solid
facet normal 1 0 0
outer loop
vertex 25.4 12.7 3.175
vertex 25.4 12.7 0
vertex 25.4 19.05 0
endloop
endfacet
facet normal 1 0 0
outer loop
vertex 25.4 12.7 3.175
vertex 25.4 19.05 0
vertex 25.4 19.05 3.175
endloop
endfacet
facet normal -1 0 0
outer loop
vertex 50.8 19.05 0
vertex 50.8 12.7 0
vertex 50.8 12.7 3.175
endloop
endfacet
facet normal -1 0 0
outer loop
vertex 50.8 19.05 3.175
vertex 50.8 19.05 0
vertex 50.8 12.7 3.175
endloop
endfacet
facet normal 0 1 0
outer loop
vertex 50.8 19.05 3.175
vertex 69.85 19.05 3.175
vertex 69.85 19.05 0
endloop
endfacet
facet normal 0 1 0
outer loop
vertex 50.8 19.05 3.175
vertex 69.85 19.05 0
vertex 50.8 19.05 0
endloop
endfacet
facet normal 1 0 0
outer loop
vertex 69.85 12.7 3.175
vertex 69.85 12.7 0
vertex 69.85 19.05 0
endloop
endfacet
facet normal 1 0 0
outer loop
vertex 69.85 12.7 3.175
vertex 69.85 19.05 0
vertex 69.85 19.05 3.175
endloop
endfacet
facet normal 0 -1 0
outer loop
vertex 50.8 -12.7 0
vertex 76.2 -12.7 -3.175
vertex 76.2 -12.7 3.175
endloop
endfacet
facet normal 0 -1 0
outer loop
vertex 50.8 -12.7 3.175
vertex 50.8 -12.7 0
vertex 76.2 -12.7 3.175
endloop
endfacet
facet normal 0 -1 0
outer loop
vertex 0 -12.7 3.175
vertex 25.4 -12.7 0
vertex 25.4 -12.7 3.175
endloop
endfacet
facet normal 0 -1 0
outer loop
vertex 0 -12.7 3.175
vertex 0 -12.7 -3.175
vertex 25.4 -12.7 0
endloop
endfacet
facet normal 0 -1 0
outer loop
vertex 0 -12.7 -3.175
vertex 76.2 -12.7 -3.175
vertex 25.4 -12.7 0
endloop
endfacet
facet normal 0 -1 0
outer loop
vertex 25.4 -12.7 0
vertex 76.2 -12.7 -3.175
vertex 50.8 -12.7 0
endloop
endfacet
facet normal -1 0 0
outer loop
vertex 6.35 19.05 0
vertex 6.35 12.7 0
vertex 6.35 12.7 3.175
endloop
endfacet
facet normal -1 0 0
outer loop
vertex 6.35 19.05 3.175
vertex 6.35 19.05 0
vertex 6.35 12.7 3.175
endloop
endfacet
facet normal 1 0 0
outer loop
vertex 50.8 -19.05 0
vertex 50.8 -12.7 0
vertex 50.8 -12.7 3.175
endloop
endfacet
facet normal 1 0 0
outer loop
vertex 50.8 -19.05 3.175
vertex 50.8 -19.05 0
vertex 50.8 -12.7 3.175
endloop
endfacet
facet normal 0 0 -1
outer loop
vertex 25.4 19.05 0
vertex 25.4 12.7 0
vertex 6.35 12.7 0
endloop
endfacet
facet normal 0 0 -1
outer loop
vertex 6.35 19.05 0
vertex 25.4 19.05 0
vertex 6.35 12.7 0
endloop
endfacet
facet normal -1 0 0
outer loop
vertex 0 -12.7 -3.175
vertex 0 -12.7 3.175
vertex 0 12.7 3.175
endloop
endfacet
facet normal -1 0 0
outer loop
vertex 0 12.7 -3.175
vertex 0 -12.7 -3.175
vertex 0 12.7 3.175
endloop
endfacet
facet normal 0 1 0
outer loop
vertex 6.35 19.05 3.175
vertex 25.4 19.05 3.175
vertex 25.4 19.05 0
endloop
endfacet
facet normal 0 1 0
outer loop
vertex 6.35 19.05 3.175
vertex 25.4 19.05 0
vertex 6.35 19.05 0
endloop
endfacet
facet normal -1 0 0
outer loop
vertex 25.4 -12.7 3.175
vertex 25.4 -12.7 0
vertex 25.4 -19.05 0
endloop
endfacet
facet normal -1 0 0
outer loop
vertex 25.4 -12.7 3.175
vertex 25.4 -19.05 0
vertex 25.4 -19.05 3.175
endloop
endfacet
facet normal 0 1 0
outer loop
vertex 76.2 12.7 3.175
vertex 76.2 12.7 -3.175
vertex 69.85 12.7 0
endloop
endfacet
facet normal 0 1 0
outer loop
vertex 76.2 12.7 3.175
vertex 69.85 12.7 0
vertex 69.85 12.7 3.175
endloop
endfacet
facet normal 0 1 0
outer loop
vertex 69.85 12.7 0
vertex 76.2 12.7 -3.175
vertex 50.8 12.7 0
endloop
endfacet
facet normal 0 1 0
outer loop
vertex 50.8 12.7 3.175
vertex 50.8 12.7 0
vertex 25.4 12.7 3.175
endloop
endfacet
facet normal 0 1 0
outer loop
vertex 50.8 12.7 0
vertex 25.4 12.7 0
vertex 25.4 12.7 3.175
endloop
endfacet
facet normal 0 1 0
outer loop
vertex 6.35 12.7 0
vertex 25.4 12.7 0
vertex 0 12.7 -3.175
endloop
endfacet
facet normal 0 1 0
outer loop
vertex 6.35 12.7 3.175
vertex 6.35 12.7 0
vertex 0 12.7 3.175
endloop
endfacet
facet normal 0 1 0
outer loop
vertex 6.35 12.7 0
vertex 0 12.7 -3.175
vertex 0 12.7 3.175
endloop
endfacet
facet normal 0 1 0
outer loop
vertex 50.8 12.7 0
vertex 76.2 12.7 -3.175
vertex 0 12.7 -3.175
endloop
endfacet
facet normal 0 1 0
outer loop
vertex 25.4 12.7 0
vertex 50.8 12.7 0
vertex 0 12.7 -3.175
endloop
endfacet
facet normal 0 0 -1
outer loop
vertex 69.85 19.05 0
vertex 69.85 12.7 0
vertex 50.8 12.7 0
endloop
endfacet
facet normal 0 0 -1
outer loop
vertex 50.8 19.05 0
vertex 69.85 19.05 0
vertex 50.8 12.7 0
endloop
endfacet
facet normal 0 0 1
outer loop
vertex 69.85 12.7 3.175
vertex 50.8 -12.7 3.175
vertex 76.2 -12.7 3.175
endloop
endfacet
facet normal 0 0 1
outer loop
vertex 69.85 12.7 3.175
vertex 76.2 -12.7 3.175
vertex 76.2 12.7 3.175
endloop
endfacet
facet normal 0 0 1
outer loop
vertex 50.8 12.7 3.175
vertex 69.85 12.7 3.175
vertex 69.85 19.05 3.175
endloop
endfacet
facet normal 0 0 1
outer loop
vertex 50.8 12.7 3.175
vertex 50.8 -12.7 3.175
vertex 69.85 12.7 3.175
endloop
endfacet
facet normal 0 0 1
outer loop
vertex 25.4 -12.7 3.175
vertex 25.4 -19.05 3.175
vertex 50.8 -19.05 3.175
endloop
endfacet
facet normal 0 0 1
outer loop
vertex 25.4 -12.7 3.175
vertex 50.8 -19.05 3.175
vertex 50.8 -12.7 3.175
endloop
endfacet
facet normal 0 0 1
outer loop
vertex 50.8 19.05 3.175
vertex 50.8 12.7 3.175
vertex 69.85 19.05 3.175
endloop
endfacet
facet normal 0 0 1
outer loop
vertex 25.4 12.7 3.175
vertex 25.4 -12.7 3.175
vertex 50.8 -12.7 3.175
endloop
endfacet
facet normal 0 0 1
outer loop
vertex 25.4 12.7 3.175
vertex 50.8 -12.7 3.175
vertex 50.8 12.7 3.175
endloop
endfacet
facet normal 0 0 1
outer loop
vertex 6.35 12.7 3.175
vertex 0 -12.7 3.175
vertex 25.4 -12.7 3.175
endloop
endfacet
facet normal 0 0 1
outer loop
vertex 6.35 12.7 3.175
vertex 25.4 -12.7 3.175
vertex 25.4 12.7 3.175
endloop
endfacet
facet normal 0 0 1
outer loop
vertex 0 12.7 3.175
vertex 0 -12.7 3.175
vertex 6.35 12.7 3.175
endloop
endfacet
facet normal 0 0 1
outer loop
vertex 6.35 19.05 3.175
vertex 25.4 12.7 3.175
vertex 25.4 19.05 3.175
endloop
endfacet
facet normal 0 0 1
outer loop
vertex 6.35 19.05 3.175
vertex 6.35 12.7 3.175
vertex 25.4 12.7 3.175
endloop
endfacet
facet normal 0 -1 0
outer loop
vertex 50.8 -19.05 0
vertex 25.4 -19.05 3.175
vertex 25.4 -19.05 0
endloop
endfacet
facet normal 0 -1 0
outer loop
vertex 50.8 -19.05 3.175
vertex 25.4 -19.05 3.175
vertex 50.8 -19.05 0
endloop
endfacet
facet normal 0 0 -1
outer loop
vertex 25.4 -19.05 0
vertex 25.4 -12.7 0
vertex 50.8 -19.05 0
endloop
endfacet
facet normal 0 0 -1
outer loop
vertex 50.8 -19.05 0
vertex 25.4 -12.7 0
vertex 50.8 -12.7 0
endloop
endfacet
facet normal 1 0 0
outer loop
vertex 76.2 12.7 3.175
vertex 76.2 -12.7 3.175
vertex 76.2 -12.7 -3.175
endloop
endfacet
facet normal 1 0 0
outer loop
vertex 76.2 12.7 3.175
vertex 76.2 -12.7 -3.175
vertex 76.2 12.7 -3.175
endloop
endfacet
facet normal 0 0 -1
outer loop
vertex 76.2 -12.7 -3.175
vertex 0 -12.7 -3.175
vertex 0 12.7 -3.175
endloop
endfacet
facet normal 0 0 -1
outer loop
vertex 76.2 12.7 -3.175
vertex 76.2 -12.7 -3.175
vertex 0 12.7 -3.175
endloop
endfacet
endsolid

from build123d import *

# Parameters (mm, degrees)
F0_W     = 25.4
F0_H     = 6.35
F1_DEPTH = 76.2
F2_W     = 25.4
F2_H     = 3.175
F3_DEPTH = 6.35
F4_W     = 19.05
F4_H     = 3.175
F5_DEPTH = 6.35


with BuildPart() as f1:
    # F0 (on Right) → F1 (new body)
    with BuildSketch(Plane.YZ):
        Rectangle(F0_W, F0_H)
    extrude(amount=F1_DEPTH)

    # F2 (on face) → F3 (join)
    with BuildSketch(Plane.XZ.offset(12.7)):
        with Locations((38.1, 1.5875)):
            Rectangle(F2_W, F2_H)
    extrude(amount=F3_DEPTH)

    # F4 (on face) → F5 (join)
    with BuildSketch(Plane(origin=(0, 12.7, 0), x_dir=(-1, 0, 0), z_dir=(0, 1, 0))):
        with Locations((-60.325, 1.5875)):
            Rectangle(F4_W, F4_H)
        with Locations((-15.875, 1.5875)):
            Rectangle(F4_W, F4_H)
    extrude(amount=F5_DEPTH)


solid = f1.part
